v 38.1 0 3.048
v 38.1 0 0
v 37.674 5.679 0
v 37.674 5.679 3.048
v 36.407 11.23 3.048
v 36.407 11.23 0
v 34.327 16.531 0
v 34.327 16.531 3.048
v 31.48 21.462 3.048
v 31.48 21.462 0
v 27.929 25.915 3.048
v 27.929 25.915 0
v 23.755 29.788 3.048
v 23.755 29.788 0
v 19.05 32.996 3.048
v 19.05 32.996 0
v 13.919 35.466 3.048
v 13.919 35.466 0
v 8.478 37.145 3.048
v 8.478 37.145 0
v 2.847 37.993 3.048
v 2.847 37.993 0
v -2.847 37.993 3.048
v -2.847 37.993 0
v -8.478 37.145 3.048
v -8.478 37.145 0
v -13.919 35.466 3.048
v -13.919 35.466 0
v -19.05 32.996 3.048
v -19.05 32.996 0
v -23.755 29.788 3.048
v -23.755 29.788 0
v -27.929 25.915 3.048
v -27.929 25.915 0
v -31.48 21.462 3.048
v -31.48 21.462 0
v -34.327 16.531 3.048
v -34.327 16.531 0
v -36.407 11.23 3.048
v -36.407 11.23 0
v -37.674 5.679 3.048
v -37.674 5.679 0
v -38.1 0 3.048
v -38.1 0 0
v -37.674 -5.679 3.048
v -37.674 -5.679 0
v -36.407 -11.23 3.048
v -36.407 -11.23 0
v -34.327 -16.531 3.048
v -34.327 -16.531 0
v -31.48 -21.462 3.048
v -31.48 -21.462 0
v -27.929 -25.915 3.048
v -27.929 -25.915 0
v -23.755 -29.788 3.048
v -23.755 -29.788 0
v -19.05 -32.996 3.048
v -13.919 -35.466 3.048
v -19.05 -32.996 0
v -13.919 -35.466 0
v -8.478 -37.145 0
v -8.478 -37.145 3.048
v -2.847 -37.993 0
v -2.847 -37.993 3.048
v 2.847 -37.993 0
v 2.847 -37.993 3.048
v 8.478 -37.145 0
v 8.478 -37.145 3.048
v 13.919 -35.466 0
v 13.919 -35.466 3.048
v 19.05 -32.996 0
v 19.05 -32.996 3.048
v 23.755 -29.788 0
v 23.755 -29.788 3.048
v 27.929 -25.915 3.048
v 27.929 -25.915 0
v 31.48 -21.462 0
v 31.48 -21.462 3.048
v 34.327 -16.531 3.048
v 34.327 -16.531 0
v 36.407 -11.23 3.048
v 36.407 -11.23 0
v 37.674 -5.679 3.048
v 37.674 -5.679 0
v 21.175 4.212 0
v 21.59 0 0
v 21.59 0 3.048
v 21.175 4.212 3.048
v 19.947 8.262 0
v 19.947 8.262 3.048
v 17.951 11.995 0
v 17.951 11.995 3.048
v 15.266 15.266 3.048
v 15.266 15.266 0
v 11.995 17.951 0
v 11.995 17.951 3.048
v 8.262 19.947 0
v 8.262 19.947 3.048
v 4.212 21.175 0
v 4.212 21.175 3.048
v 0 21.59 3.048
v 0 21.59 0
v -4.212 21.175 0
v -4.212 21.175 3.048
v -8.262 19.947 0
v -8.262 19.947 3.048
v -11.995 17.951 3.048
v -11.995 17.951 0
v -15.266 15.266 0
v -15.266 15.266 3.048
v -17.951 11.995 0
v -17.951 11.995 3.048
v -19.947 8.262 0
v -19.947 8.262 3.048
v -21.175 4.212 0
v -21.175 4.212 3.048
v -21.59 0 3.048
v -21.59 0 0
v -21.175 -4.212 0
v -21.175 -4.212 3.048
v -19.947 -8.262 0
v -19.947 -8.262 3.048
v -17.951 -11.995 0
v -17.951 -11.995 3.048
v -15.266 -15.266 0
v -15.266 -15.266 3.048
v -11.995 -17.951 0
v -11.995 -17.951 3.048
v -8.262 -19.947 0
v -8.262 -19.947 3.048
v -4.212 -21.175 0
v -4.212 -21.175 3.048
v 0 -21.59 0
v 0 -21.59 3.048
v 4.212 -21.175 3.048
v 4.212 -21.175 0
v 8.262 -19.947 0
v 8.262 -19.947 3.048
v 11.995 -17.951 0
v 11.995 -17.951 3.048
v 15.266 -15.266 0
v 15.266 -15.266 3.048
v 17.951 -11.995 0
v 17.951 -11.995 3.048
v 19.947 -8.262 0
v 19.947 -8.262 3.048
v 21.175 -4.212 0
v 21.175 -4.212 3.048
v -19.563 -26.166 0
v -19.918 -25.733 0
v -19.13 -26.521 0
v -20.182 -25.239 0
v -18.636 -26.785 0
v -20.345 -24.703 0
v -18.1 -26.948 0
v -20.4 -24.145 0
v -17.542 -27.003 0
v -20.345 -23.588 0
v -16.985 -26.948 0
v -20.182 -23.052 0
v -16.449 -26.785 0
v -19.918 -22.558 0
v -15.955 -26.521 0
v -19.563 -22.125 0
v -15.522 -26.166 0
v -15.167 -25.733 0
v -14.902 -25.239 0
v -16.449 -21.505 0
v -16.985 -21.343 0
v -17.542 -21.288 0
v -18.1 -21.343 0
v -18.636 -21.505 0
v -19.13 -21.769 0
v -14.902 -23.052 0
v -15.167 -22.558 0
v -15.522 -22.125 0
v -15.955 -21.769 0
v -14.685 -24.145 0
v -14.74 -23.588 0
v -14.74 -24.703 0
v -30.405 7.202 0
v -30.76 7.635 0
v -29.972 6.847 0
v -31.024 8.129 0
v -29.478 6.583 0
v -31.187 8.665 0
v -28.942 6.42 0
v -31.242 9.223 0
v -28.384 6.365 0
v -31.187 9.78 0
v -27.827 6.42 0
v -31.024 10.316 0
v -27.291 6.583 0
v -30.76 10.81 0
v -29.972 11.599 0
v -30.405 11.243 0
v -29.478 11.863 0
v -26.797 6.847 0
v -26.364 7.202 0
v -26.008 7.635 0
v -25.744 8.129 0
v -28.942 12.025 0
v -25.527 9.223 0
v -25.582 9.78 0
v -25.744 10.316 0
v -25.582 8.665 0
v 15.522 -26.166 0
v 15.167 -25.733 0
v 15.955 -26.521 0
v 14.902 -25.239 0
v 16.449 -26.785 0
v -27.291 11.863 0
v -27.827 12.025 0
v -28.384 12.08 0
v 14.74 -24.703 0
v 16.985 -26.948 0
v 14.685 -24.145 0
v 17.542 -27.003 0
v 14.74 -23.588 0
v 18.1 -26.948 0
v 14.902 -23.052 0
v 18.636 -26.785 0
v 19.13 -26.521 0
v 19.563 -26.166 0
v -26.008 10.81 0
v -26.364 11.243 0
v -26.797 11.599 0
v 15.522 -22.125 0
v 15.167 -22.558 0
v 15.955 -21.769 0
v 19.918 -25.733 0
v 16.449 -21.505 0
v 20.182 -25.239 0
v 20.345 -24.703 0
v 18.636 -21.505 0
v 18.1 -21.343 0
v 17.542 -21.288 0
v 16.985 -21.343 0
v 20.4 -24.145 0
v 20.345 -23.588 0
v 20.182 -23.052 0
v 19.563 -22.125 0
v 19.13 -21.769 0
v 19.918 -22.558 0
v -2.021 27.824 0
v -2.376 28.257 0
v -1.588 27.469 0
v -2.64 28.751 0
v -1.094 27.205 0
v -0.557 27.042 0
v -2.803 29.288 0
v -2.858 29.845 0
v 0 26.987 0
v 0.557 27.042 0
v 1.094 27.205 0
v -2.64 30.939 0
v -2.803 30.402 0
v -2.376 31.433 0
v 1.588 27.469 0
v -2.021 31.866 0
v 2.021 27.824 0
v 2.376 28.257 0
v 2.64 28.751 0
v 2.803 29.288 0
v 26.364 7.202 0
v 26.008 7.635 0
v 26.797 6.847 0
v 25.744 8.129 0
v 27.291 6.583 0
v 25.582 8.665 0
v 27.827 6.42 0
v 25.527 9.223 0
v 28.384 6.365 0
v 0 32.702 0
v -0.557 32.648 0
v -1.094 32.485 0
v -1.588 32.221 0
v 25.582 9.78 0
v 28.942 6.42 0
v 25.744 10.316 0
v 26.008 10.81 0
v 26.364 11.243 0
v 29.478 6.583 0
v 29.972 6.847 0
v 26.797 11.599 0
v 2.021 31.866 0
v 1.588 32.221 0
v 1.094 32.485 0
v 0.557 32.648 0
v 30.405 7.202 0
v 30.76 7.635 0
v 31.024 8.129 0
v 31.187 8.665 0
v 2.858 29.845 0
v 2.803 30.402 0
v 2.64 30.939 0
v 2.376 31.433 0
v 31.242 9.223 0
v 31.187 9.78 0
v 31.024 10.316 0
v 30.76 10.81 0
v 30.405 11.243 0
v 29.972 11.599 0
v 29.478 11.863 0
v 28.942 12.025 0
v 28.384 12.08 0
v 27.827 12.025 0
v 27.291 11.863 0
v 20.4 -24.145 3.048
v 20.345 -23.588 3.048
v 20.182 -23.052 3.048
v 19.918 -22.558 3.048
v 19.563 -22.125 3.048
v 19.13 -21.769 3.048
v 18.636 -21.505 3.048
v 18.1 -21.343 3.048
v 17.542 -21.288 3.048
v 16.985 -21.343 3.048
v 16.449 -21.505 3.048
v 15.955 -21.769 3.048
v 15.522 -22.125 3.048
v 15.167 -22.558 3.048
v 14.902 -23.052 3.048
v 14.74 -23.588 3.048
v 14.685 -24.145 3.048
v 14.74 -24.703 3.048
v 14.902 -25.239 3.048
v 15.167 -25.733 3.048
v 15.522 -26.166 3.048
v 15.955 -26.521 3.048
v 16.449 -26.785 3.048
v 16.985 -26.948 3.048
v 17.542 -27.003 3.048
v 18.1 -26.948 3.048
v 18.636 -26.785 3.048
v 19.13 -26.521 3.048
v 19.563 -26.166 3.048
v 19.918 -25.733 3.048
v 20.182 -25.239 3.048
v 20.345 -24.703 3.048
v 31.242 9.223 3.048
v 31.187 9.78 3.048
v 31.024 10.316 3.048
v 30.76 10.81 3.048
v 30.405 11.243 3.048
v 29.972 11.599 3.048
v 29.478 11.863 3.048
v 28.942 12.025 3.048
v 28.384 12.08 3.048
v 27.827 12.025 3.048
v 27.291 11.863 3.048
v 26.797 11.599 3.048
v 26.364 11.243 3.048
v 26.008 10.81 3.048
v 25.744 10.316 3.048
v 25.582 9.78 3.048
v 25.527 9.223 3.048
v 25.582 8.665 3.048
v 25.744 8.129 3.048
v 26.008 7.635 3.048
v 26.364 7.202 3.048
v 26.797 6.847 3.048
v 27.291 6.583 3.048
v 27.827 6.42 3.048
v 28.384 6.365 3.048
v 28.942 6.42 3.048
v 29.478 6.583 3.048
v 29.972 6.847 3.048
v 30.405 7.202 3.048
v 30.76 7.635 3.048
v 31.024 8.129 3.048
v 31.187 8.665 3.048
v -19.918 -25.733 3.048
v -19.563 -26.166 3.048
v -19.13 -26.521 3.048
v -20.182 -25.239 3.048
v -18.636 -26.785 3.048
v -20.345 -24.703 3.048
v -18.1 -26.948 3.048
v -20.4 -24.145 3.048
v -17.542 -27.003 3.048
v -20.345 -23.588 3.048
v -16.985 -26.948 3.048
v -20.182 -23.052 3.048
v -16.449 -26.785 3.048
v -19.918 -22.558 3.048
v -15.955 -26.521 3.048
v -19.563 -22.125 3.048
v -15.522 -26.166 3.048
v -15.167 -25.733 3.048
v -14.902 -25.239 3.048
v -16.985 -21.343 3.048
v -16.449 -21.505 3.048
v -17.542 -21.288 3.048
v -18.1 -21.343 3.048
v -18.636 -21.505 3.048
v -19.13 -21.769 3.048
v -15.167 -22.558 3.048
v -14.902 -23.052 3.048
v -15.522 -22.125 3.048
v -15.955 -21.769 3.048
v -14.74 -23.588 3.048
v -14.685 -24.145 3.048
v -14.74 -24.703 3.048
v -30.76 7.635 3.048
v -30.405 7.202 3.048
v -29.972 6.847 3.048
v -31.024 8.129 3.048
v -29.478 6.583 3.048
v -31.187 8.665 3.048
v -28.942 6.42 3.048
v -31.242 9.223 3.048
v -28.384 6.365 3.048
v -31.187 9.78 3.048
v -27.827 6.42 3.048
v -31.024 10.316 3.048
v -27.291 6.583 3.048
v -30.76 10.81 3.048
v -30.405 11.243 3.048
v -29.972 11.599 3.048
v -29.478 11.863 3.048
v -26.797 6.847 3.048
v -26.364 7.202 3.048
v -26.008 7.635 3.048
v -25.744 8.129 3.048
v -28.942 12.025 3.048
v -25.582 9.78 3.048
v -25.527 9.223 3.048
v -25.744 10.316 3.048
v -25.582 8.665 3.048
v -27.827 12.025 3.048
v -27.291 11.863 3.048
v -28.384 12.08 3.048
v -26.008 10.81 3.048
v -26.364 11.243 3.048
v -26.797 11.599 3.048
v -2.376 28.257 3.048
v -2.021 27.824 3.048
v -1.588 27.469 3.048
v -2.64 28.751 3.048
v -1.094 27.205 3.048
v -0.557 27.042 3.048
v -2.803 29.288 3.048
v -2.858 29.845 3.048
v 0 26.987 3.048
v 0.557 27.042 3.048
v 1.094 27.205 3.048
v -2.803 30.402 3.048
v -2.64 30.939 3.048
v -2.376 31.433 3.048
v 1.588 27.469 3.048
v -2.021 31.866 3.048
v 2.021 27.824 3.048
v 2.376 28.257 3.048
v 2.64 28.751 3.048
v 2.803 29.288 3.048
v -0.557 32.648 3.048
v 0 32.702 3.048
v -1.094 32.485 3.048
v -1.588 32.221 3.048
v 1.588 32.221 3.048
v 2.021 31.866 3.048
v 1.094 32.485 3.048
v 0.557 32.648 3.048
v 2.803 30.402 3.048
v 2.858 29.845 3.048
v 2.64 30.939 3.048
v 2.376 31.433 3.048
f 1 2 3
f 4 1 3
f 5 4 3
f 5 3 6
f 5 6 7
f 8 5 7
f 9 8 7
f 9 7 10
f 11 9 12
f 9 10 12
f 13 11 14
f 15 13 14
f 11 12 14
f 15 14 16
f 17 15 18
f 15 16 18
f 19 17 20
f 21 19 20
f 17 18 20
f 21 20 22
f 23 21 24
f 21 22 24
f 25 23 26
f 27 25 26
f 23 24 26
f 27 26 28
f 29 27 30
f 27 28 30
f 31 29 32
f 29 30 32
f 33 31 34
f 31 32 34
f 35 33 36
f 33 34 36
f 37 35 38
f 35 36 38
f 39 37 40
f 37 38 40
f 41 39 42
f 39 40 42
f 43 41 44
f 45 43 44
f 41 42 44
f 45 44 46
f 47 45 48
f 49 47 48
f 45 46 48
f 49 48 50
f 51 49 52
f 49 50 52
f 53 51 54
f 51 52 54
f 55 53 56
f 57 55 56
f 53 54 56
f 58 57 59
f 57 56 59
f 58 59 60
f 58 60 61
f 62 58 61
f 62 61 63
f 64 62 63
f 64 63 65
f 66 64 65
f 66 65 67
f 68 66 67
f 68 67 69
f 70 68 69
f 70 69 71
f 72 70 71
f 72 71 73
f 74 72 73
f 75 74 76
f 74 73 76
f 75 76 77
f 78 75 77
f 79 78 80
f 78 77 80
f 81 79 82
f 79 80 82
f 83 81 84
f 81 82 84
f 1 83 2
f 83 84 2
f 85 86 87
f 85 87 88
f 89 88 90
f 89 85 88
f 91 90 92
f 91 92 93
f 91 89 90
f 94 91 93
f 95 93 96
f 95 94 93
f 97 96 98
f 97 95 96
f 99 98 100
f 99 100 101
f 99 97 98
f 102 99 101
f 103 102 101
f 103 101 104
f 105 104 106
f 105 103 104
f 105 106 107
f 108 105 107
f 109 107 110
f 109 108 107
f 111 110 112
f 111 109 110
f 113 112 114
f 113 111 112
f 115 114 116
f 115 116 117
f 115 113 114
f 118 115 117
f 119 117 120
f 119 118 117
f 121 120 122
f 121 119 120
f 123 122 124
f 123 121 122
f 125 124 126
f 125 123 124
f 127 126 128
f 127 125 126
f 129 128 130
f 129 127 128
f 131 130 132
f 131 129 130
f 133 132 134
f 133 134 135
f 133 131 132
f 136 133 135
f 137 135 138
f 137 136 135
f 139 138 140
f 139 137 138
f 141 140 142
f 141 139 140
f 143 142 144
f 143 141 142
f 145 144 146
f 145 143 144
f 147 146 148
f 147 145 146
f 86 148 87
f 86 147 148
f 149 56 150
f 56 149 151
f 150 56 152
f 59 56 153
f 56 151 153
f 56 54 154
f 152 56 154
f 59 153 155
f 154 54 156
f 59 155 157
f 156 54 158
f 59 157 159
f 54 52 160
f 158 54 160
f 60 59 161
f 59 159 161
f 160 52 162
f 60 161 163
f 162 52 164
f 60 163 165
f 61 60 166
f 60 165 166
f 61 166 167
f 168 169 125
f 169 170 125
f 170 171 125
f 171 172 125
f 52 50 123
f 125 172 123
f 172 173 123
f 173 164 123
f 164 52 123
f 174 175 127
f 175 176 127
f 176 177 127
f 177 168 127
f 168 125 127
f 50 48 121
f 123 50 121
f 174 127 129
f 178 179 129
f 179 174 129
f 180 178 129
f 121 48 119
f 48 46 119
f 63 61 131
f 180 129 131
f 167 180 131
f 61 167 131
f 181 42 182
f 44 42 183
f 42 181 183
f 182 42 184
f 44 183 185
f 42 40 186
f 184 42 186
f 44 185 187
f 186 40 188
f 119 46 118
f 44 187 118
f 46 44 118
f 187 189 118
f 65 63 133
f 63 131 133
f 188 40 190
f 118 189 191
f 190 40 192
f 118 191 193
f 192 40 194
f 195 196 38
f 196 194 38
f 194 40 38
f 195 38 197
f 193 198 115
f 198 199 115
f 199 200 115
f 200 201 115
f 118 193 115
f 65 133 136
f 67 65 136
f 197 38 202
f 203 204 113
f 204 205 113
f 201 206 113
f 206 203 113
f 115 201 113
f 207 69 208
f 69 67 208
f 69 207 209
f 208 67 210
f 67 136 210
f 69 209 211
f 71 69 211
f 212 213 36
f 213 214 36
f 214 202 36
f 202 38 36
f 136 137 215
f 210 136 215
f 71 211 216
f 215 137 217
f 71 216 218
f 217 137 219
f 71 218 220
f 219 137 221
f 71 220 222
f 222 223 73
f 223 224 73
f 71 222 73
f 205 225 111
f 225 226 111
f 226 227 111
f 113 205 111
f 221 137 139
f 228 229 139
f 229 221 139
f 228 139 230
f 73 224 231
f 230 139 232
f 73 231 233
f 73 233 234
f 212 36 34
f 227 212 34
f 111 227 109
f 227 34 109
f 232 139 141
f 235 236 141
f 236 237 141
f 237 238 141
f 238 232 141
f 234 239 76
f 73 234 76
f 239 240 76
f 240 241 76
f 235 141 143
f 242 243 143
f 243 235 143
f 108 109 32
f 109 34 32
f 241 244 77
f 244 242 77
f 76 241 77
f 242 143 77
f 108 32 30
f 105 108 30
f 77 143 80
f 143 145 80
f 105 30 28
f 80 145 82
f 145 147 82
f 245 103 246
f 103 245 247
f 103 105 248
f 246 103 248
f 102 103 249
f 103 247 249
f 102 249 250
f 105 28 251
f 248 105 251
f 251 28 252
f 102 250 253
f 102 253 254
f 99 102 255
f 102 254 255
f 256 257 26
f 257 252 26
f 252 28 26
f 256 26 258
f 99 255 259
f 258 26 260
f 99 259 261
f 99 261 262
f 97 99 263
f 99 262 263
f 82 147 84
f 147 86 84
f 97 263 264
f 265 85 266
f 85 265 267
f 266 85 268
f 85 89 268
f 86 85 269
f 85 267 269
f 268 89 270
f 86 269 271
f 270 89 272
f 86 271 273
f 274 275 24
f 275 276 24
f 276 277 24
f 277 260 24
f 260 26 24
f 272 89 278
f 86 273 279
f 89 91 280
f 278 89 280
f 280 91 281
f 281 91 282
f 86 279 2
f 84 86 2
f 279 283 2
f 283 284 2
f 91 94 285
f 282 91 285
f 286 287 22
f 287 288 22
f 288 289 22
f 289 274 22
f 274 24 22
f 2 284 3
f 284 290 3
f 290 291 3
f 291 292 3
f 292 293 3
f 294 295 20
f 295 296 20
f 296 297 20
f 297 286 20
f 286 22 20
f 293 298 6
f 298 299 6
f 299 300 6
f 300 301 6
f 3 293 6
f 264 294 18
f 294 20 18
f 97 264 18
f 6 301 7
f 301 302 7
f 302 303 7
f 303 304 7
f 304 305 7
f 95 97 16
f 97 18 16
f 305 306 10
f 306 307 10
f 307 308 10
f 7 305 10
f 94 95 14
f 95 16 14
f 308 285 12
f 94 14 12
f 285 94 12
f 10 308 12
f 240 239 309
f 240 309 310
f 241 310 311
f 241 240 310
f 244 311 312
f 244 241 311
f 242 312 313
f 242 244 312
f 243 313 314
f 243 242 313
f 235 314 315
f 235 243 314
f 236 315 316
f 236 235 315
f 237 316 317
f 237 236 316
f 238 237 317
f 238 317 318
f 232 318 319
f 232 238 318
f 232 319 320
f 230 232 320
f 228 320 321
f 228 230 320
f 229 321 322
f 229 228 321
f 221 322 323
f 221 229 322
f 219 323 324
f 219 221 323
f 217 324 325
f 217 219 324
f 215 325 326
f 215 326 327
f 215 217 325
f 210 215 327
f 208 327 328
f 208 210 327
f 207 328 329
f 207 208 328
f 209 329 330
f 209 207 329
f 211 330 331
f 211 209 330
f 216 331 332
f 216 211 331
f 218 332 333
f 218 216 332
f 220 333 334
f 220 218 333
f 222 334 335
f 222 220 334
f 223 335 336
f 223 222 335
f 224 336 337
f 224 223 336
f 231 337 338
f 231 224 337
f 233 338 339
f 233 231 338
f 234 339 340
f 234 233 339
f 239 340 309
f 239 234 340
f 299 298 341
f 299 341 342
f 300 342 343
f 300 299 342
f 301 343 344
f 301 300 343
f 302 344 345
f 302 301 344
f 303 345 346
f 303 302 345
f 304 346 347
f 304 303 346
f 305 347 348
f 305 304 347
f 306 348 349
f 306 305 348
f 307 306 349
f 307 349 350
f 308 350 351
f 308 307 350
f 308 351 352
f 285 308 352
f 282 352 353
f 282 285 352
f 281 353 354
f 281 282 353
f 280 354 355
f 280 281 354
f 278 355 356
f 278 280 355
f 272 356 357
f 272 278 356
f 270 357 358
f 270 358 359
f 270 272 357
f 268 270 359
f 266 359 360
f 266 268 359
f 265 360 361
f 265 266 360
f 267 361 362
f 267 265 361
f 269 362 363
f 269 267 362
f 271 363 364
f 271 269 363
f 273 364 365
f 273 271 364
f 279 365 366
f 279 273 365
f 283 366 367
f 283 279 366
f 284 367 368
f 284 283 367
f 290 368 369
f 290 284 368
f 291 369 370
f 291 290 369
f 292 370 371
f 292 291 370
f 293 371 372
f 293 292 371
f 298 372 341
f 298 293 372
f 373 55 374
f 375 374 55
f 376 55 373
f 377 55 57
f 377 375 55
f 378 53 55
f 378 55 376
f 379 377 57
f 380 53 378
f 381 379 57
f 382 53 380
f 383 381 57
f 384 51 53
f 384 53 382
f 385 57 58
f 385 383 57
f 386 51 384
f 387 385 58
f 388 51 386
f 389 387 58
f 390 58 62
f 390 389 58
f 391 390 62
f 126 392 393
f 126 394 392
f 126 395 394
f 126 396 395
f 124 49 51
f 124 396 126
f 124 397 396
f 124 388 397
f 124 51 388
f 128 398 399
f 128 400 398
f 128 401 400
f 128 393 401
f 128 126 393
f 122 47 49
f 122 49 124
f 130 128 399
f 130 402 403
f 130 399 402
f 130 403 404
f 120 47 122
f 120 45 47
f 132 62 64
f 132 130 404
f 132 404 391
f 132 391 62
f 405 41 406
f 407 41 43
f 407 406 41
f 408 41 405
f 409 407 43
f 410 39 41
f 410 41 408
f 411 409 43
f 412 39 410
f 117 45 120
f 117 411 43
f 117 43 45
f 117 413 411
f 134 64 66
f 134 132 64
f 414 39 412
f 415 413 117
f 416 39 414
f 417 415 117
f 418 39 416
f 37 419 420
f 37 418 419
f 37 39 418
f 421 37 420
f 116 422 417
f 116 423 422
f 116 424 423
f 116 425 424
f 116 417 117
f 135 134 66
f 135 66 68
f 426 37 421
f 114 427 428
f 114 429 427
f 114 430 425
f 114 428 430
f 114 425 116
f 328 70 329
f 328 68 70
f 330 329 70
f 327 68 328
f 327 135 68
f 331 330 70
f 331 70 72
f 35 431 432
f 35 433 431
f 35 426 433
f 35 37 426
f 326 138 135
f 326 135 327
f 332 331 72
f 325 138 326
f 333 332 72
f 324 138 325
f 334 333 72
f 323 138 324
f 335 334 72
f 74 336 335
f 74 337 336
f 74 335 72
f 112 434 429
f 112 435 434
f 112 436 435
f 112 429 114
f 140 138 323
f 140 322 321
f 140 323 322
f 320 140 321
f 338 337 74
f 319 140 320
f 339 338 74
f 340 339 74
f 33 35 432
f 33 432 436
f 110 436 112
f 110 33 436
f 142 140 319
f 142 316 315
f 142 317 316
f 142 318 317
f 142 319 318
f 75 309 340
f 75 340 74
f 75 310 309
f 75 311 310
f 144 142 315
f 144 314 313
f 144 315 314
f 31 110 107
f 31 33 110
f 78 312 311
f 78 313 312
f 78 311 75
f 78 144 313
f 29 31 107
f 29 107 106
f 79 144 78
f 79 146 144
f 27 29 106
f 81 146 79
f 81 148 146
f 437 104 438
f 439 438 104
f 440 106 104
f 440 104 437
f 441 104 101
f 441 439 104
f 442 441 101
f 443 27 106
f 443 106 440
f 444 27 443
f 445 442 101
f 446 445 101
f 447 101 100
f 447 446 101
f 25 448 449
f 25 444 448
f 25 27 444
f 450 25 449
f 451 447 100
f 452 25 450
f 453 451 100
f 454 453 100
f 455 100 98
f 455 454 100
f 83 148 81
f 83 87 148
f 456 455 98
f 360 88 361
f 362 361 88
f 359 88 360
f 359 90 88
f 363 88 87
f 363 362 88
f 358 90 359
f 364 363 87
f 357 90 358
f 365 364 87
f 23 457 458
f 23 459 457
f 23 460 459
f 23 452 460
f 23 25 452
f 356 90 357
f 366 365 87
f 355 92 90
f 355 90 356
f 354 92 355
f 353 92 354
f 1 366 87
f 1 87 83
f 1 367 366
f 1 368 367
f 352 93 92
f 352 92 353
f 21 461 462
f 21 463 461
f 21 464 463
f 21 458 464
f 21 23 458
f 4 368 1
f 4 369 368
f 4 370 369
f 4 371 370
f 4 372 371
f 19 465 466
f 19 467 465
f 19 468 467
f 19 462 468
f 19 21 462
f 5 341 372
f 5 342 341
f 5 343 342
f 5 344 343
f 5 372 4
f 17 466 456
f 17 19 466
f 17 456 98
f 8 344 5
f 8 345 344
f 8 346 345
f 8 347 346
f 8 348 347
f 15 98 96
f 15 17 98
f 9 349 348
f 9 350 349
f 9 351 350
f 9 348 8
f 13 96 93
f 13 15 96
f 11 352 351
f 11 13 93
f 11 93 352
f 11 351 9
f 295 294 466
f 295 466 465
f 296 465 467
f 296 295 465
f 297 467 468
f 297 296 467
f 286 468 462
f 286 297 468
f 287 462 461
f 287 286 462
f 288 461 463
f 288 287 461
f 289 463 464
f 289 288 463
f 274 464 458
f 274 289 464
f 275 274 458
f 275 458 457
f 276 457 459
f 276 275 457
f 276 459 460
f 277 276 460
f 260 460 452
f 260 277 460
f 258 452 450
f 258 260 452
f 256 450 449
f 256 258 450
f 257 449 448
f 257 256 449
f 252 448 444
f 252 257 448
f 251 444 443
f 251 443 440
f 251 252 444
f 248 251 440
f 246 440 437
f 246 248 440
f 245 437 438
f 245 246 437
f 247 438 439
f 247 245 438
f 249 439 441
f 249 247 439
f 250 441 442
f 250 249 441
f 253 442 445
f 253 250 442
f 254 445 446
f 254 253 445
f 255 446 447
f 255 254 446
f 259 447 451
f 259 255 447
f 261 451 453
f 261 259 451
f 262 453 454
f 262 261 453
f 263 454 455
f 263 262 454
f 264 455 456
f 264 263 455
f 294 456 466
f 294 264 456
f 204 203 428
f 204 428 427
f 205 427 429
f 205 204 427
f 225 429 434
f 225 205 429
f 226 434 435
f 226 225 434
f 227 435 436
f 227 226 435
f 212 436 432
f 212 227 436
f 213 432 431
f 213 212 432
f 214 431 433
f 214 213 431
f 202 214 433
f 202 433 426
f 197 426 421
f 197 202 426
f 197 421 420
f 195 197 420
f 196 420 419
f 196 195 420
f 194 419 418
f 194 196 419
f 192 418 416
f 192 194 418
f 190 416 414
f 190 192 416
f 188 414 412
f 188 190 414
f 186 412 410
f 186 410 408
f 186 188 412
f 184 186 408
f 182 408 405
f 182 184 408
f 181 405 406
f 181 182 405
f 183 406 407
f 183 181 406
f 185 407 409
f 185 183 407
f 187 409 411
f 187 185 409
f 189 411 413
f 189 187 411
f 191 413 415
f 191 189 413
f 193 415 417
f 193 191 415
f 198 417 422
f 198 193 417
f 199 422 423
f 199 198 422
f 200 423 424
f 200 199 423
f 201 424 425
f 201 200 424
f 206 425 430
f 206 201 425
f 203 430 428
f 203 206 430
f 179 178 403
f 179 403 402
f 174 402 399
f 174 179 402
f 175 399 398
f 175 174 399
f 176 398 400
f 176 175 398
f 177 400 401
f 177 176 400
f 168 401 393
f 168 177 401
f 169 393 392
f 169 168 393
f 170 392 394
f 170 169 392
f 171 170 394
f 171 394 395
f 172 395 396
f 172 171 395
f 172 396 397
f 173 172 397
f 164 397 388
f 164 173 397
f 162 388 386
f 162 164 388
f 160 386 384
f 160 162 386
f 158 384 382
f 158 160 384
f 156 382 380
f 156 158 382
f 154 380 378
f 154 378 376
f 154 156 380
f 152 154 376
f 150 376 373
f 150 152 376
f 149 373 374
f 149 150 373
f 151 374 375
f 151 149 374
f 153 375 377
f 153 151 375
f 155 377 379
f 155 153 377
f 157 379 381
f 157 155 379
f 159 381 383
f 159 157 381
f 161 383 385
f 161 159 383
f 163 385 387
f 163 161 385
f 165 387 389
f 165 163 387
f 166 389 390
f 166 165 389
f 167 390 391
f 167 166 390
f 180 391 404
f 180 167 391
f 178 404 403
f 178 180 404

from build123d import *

# Parameters (mm, degrees)
F0_R     = 38.1
F0_R_2   = 2.8575
F0_R_3   = 21.59
F1_DEPTH = 3.048


with BuildPart() as f1:
    # F0 (on Top) → F1 (new body)
    with BuildSketch(Plane.XY):
        Circle(F0_R)
        with Locations((-17.542451, -24.145112)):
            Circle(F0_R_2, mode=Mode.SUBTRACT)
        with Locations((17.542451, -24.145112)):
            Circle(F0_R_2, mode=Mode.SUBTRACT)
        with Locations((-28.384282, 9.222612)):
            Circle(F0_R_2, mode=Mode.SUBTRACT)
        Circle(F0_R_3, mode=Mode.SUBTRACT)
        with Locations((28.384282, 9.222612)):
            Circle(F0_R_2, mode=Mode.SUBTRACT)
        with Locations((0, 29.845)):
            Circle(F0_R_2, mode=Mode.SUBTRACT)
    extrude(amount=F1_DEPTH)


solid = f1.part
